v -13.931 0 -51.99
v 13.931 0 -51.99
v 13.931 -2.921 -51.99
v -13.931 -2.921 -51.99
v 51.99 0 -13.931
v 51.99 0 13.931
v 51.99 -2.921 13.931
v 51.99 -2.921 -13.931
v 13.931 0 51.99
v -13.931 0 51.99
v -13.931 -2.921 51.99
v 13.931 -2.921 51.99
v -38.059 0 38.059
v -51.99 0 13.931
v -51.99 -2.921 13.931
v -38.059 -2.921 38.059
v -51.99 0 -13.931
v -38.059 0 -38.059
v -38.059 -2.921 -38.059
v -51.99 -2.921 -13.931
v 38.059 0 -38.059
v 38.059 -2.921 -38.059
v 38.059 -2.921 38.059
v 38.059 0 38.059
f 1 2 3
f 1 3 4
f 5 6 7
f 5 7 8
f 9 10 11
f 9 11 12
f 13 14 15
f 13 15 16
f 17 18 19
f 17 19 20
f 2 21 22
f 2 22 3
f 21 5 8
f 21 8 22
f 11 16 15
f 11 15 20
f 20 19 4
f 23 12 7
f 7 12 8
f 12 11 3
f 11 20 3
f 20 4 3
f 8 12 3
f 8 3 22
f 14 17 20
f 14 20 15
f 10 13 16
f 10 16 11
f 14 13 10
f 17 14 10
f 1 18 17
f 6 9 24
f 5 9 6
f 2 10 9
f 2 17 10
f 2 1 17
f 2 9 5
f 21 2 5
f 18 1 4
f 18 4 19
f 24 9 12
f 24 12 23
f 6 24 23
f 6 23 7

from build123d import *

# Parameters (mm, degrees)
BOSS_EXTRUDE1_DEPTH = 2.921
BOSS_EXTRUDE2_DEPTH = 2.921


with BuildPart() as part:
    # Sketch1 → Boss-Extrude1 (new body)
    with BuildSketch(Plane(origin=(0, 0, 0), x_dir=(1, 0, 0), z_dir=(0, 1, 0))):
        Polygon((49.069031975, 13.148007491), (35.921024484, 35.921024484), (13.148007491, 49.069031975), (-13.148007491, 49.069031975), (-35.921024484, 35.921024484), (-49.069031975, 13.148007491), (-49.069031975, -13.148007491), (-35.921024484, -35.921024484), (-13.148007491, -49.069031975), (13.148007491, -49.069031975), (35.921024484, -35.921024484), (49.069031975, -13.148007491), align=None)
    extrude(amount=-BOSS_EXTRUDE1_DEPTH)

    # Sketch2 → Boss-Extrude2 (add)
    with BuildSketch(Plane(origin=(0, 0, 0), x_dir=(1, 0, 0), z_dir=(0, 1, 0))):
        Polygon((51.990031975, 13.930687082), (38.059344893, 38.059344893), (13.930687082, 51.990031975), (-13.930687082, 51.990031975), (-38.059344893, 38.059344893), (-51.990031975, 13.930687082), (-51.990031975, -13.930687082), (-38.059344893, -38.059344893), (-13.930687082, -51.990031975), (13.930687082, -51.990031975), (38.059344893, -38.059344893), (51.990031975, -13.930687082), align=None)
        Polygon((49.069031975, 13.148007491), (35.921024484, 35.921024484), (13.148007491, 49.069031975), (-13.148007491, 49.069031975), (-35.921024484, 35.921024484), (-49.069031975, 13.148007491), (-49.069031975, -13.148007491), (-35.921024484, -35.921024484), (-13.148007491, -49.069031975), (13.148007491, -49.069031975), (35.921024484, -35.921024484), (49.069031975, -13.148007491), align=None, mode=Mode.SUBTRACT)
    extrude(amount=-BOSS_EXTRUDE2_DEPTH)


solid = part.part
